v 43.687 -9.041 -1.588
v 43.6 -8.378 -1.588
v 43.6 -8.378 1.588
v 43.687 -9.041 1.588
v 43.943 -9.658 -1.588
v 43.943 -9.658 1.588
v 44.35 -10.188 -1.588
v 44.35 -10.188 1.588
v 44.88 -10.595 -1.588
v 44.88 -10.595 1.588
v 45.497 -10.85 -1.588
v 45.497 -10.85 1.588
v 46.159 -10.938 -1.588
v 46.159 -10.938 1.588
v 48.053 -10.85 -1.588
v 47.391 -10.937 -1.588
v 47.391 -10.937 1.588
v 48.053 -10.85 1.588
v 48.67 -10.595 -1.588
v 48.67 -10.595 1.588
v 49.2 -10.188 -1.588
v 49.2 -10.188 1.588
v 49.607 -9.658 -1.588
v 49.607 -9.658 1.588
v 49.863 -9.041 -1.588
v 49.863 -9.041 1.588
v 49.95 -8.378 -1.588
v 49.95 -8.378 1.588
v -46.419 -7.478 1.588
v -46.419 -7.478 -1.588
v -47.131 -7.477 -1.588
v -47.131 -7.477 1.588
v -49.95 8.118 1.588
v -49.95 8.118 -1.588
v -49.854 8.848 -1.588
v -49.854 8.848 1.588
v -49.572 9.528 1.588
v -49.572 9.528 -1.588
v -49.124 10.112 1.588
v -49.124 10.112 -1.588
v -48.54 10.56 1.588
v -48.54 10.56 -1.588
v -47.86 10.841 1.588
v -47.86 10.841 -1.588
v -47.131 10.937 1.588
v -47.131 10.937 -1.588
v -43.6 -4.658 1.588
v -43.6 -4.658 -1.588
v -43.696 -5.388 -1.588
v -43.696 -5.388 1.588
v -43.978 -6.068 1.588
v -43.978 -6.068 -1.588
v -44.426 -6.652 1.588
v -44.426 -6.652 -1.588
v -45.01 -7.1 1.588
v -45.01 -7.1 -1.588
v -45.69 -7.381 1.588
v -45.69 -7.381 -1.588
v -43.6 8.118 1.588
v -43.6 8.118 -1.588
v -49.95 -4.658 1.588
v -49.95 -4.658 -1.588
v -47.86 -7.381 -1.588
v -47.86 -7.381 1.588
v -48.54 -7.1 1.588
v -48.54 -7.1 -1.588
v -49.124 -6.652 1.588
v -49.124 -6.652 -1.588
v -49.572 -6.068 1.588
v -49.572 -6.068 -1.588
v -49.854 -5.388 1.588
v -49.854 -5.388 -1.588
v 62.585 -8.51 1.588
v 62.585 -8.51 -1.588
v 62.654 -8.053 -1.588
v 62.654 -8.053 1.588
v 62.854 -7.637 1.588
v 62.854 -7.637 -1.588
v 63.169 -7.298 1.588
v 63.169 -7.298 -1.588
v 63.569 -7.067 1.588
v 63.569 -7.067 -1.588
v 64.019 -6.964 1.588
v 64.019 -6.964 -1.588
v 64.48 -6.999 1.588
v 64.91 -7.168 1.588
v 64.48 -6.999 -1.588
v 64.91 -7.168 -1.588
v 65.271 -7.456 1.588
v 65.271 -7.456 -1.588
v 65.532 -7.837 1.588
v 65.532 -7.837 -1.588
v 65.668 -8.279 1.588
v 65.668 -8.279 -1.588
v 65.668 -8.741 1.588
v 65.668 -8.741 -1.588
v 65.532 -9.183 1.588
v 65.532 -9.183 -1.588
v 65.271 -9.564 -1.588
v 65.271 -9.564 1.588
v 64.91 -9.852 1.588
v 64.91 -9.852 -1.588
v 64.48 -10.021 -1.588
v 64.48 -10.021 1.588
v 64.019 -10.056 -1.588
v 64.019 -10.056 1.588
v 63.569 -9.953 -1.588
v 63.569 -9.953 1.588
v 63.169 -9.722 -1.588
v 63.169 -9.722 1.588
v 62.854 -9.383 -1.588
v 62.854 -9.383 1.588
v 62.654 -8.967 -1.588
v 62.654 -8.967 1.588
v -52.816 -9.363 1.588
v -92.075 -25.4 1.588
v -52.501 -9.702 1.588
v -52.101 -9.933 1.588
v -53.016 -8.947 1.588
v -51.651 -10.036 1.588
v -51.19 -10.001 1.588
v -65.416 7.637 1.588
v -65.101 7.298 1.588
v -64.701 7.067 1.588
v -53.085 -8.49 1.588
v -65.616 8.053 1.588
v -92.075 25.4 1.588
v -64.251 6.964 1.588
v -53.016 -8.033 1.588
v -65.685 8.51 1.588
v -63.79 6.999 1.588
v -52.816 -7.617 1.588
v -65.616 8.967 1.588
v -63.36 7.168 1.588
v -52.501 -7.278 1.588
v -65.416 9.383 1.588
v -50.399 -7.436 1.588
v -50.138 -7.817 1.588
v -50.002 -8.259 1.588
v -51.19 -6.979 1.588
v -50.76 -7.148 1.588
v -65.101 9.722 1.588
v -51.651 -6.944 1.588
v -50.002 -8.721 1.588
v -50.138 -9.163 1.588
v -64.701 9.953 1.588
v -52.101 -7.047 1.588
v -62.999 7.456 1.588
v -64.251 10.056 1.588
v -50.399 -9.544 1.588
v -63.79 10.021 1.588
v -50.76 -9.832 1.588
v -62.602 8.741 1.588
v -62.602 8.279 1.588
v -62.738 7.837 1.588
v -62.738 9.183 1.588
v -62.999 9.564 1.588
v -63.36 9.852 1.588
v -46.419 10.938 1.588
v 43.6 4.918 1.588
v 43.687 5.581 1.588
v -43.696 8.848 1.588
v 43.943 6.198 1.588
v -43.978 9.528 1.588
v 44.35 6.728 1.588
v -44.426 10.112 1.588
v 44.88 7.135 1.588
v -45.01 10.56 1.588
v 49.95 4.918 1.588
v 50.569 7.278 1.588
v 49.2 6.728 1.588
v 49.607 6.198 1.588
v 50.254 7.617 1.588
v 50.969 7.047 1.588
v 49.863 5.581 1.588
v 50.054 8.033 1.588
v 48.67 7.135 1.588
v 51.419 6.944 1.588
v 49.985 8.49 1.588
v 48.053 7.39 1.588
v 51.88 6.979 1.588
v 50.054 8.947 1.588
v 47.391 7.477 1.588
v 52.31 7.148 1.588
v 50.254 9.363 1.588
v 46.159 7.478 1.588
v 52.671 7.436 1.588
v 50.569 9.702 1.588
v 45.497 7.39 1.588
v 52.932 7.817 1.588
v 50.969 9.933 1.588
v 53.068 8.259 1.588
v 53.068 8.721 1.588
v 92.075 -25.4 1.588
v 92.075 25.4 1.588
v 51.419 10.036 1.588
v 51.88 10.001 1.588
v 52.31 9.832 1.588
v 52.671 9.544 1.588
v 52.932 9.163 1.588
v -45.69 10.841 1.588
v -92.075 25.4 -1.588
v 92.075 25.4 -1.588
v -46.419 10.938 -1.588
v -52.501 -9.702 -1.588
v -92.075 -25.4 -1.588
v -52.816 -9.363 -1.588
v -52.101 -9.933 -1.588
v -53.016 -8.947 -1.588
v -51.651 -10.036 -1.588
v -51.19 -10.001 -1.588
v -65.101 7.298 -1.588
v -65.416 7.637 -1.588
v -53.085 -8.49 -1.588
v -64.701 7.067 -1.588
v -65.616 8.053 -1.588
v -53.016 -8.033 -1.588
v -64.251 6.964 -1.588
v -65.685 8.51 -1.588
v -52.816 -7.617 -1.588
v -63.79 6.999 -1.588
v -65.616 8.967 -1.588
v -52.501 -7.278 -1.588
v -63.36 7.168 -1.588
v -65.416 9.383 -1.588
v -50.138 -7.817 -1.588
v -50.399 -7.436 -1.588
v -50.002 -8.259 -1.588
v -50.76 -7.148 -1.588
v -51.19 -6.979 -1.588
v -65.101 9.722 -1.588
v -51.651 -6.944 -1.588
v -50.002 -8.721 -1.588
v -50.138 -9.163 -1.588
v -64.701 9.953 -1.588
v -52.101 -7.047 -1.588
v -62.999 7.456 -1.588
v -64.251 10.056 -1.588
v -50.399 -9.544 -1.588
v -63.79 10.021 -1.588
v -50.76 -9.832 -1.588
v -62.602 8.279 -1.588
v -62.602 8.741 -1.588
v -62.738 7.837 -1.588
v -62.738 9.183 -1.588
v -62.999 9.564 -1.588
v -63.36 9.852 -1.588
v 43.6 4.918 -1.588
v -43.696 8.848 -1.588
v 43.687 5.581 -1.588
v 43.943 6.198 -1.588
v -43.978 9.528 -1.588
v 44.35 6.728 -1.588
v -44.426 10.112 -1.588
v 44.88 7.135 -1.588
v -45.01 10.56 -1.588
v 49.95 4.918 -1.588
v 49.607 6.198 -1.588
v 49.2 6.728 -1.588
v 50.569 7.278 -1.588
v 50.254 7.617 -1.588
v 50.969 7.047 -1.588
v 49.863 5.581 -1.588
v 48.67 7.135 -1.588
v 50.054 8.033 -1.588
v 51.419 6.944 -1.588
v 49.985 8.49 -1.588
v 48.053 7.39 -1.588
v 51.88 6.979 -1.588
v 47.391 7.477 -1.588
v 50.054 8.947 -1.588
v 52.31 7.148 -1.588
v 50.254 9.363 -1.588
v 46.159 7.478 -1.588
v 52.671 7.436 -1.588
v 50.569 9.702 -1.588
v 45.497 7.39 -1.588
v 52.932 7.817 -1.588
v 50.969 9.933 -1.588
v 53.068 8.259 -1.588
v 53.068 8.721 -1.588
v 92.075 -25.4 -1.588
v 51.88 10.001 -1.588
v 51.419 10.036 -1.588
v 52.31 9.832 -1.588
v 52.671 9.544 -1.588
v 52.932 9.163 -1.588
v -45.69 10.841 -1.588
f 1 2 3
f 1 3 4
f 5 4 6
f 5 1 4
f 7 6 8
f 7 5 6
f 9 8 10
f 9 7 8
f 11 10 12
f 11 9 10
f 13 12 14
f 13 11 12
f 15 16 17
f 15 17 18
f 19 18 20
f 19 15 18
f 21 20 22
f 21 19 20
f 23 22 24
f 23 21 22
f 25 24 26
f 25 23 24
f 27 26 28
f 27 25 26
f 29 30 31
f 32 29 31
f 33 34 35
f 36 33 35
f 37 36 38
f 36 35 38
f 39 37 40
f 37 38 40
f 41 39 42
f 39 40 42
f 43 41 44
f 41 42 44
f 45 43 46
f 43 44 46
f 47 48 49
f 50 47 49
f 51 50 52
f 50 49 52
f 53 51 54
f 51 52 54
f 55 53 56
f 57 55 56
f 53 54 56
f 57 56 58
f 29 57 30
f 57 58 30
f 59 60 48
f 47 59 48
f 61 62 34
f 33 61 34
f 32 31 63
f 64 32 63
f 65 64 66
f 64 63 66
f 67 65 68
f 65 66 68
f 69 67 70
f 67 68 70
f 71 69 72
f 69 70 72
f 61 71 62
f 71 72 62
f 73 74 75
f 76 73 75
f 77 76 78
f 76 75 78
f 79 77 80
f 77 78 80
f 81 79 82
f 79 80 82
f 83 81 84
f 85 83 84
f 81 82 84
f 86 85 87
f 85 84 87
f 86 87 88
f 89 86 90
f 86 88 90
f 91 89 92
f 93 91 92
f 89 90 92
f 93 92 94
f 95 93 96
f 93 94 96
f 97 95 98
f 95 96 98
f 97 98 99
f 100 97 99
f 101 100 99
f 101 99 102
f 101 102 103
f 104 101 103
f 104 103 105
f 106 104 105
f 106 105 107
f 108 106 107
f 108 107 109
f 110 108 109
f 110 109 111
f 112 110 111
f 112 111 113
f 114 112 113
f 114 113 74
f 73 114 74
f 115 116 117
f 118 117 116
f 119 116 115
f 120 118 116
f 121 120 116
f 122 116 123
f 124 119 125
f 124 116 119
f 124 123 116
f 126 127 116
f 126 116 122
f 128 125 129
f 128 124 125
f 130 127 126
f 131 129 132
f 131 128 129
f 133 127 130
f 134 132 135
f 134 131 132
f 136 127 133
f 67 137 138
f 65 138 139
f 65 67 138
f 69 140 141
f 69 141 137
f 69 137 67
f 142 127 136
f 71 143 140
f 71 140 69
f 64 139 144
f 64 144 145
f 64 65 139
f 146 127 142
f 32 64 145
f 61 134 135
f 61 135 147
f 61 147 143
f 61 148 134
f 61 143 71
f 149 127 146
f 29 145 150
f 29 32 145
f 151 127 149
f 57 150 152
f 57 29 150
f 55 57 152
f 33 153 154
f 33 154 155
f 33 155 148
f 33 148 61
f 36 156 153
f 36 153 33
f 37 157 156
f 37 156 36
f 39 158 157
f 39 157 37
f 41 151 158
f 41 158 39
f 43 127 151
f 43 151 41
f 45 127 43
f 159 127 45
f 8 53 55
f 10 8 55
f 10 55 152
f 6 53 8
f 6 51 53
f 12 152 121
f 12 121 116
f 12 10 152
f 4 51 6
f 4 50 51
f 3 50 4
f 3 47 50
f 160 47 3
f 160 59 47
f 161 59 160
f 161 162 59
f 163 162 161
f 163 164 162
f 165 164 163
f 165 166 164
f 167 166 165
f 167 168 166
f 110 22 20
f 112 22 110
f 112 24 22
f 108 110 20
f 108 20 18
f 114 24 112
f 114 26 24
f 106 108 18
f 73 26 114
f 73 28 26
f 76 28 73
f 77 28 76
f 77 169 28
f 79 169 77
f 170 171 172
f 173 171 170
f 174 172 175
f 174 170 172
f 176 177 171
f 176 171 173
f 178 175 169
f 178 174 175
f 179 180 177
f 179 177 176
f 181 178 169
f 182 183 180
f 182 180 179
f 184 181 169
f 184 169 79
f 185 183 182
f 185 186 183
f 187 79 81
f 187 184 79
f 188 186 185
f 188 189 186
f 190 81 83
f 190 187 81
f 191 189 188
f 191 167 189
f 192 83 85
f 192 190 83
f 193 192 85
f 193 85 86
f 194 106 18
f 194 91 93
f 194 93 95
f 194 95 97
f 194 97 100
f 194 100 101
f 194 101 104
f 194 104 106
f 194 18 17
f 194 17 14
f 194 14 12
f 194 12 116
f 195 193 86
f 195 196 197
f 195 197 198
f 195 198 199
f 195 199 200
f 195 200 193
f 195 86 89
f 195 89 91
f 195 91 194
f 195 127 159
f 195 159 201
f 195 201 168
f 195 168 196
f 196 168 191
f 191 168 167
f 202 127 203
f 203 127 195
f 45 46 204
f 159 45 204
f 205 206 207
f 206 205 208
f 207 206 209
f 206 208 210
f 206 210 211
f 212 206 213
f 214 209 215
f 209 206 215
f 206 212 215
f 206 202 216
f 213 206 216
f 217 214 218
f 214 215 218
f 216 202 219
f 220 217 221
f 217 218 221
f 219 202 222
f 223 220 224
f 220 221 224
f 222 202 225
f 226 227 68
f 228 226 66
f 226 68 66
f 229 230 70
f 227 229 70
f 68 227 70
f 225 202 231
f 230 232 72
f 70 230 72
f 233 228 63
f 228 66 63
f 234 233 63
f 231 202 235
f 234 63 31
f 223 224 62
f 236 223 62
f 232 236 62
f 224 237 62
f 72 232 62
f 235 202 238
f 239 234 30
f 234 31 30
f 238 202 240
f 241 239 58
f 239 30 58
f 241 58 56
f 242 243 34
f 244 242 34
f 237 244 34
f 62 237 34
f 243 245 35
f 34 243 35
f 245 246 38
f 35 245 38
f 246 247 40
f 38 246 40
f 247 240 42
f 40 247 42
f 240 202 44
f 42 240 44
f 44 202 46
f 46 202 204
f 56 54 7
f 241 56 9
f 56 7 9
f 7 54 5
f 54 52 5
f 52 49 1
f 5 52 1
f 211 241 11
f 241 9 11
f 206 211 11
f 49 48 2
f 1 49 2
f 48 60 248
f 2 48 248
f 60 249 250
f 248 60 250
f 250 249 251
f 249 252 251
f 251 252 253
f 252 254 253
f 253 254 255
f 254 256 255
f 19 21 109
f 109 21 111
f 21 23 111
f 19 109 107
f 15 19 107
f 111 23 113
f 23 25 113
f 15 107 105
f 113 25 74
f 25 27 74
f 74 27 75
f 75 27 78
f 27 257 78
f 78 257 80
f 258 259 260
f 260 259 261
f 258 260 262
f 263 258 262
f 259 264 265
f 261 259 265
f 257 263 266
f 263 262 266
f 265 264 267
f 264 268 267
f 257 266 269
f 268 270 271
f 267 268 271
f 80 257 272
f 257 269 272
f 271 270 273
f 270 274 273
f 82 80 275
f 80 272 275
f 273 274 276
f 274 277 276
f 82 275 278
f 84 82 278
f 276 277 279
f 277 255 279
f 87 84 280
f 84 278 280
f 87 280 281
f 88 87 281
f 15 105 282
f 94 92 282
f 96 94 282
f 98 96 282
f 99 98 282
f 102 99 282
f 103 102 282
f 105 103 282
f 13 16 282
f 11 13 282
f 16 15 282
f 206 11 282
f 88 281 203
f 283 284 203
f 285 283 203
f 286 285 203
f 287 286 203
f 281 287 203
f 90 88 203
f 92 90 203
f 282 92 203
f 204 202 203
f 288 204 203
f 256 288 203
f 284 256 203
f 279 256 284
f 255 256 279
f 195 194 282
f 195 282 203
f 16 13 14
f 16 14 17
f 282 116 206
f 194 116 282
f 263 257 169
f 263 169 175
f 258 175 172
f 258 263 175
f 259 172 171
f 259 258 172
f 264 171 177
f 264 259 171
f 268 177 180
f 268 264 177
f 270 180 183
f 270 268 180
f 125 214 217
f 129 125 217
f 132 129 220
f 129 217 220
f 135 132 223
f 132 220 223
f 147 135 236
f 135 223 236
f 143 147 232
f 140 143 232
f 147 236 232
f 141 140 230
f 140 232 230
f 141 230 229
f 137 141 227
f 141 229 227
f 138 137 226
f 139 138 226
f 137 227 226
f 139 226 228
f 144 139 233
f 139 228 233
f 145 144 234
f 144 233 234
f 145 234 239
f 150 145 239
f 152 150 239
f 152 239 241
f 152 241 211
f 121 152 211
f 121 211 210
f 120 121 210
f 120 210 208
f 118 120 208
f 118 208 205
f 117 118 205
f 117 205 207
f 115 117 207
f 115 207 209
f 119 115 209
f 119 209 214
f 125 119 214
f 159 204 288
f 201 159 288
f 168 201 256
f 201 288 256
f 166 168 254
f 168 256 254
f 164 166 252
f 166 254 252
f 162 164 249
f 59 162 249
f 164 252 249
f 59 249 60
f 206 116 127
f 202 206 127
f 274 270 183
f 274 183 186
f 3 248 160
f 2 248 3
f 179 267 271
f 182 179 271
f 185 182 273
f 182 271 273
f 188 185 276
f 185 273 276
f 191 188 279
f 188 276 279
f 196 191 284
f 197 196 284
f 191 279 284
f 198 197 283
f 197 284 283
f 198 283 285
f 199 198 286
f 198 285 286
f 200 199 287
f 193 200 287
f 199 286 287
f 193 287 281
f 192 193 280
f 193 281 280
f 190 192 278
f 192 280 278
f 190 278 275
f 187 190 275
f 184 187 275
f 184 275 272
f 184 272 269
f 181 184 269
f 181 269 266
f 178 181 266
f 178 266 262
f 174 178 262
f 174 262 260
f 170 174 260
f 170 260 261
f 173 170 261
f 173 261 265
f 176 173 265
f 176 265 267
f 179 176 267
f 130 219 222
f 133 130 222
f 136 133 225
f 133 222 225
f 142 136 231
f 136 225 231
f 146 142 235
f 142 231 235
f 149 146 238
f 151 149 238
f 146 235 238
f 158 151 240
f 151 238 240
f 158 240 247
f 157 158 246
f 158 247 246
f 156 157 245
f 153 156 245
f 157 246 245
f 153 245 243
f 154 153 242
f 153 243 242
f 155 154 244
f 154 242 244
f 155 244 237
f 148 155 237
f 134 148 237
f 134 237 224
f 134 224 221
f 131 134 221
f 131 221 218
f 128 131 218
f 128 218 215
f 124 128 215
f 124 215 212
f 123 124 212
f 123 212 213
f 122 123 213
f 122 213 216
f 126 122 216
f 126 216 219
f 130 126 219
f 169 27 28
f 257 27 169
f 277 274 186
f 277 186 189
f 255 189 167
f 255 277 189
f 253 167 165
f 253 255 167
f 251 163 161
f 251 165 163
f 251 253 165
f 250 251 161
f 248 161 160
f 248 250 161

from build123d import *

# Parameters (mm, degrees)
SKETCH2_W           = 184.15
SKETCH2_H           = 50.8
BOSS_EXTRUDE1_DEPTH = 1.5875
SKETCH3_R           = 1.55
CUT_EXTRUDE1_DEPTH  = 5.08


with BuildPart() as part:
    # Sketch2 → Boss-Extrude1 (new body, symmetric)
    with BuildSketch(Plane.XY):
        Rectangle(SKETCH2_W, SKETCH2_H)
    extrude(amount=BOSS_EXTRUDE1_DEPTH, both=True)

    # Sketch3 → Cut-Extrude1 (cut)
    with BuildSketch(Plane(origin=(0, 0, -1.5875), x_dir=(-1, 0, 0), z_dir=(0, 0, -1))):
        with Locations((-51.535, 8.49)):
            Circle(SKETCH3_R)
        with Locations((-64.135, -8.51)):
            Circle(SKETCH3_R)
        with Locations((64.135, 8.51)):
            Circle(SKETCH3_R)
        with Locations((51.535, -8.49)):
            Circle(SKETCH3_R)
        with BuildLine():
            Line((-46.159267508, -10.9375), (-47.390732492, -10.9375))
            ThreePointArc((-47.390732492, -10.9375), (-49.200407902, -10.187907902), (-49.95, -8.378232492))
            Line((-49.95, -8.378232492), (-49.95, 4.918232492))
            ThreePointArc((-49.95, 4.918232492), (-49.200407902, 6.727907902), (-47.390732492, 7.4775))
            Line((-47.390732492, 7.4775), (-46.159267508, 7.4775))
            ThreePointArc((-46.159267508, 7.4775), (-44.349592098, 6.727907902), (-43.6, 4.918232492))
            Line((-43.6, 4.918232492), (-43.6, -8.378232492))
            ThreePointArc((-43.6, -8.378232492), (-44.349592098, -10.187907902), (-46.159267508, -10.9375))
        make_face()
        with BuildLine():
            Line((46.419318463, -7.4775), (47.130681537, -7.4775))
            ThreePointArc((47.130681537, -7.4775), (49.124240741, -6.651740741), (49.95, -4.658181537))
            Line((49.95, -4.658181537), (49.95, 8.118181537))
            ThreePointArc((49.95, 8.118181537), (49.124240741, 10.111740741), (47.130681537, 10.9375))
            Line((47.130681537, 10.9375), (46.419318463, 10.9375))
            ThreePointArc((46.419318463, 10.9375), (44.425759259, 10.111740741), (43.6, 8.118181537))
            Line((43.6, 8.118181537), (43.6, -4.658181537))
            ThreePointArc((43.6, -4.658181537), (44.425759259, -6.651740741), (46.419318463, -7.4775))
        make_face()
    extrude(amount=-CUT_EXTRUDE1_DEPTH, mode=Mode.SUBTRACT)


solid = part.part
